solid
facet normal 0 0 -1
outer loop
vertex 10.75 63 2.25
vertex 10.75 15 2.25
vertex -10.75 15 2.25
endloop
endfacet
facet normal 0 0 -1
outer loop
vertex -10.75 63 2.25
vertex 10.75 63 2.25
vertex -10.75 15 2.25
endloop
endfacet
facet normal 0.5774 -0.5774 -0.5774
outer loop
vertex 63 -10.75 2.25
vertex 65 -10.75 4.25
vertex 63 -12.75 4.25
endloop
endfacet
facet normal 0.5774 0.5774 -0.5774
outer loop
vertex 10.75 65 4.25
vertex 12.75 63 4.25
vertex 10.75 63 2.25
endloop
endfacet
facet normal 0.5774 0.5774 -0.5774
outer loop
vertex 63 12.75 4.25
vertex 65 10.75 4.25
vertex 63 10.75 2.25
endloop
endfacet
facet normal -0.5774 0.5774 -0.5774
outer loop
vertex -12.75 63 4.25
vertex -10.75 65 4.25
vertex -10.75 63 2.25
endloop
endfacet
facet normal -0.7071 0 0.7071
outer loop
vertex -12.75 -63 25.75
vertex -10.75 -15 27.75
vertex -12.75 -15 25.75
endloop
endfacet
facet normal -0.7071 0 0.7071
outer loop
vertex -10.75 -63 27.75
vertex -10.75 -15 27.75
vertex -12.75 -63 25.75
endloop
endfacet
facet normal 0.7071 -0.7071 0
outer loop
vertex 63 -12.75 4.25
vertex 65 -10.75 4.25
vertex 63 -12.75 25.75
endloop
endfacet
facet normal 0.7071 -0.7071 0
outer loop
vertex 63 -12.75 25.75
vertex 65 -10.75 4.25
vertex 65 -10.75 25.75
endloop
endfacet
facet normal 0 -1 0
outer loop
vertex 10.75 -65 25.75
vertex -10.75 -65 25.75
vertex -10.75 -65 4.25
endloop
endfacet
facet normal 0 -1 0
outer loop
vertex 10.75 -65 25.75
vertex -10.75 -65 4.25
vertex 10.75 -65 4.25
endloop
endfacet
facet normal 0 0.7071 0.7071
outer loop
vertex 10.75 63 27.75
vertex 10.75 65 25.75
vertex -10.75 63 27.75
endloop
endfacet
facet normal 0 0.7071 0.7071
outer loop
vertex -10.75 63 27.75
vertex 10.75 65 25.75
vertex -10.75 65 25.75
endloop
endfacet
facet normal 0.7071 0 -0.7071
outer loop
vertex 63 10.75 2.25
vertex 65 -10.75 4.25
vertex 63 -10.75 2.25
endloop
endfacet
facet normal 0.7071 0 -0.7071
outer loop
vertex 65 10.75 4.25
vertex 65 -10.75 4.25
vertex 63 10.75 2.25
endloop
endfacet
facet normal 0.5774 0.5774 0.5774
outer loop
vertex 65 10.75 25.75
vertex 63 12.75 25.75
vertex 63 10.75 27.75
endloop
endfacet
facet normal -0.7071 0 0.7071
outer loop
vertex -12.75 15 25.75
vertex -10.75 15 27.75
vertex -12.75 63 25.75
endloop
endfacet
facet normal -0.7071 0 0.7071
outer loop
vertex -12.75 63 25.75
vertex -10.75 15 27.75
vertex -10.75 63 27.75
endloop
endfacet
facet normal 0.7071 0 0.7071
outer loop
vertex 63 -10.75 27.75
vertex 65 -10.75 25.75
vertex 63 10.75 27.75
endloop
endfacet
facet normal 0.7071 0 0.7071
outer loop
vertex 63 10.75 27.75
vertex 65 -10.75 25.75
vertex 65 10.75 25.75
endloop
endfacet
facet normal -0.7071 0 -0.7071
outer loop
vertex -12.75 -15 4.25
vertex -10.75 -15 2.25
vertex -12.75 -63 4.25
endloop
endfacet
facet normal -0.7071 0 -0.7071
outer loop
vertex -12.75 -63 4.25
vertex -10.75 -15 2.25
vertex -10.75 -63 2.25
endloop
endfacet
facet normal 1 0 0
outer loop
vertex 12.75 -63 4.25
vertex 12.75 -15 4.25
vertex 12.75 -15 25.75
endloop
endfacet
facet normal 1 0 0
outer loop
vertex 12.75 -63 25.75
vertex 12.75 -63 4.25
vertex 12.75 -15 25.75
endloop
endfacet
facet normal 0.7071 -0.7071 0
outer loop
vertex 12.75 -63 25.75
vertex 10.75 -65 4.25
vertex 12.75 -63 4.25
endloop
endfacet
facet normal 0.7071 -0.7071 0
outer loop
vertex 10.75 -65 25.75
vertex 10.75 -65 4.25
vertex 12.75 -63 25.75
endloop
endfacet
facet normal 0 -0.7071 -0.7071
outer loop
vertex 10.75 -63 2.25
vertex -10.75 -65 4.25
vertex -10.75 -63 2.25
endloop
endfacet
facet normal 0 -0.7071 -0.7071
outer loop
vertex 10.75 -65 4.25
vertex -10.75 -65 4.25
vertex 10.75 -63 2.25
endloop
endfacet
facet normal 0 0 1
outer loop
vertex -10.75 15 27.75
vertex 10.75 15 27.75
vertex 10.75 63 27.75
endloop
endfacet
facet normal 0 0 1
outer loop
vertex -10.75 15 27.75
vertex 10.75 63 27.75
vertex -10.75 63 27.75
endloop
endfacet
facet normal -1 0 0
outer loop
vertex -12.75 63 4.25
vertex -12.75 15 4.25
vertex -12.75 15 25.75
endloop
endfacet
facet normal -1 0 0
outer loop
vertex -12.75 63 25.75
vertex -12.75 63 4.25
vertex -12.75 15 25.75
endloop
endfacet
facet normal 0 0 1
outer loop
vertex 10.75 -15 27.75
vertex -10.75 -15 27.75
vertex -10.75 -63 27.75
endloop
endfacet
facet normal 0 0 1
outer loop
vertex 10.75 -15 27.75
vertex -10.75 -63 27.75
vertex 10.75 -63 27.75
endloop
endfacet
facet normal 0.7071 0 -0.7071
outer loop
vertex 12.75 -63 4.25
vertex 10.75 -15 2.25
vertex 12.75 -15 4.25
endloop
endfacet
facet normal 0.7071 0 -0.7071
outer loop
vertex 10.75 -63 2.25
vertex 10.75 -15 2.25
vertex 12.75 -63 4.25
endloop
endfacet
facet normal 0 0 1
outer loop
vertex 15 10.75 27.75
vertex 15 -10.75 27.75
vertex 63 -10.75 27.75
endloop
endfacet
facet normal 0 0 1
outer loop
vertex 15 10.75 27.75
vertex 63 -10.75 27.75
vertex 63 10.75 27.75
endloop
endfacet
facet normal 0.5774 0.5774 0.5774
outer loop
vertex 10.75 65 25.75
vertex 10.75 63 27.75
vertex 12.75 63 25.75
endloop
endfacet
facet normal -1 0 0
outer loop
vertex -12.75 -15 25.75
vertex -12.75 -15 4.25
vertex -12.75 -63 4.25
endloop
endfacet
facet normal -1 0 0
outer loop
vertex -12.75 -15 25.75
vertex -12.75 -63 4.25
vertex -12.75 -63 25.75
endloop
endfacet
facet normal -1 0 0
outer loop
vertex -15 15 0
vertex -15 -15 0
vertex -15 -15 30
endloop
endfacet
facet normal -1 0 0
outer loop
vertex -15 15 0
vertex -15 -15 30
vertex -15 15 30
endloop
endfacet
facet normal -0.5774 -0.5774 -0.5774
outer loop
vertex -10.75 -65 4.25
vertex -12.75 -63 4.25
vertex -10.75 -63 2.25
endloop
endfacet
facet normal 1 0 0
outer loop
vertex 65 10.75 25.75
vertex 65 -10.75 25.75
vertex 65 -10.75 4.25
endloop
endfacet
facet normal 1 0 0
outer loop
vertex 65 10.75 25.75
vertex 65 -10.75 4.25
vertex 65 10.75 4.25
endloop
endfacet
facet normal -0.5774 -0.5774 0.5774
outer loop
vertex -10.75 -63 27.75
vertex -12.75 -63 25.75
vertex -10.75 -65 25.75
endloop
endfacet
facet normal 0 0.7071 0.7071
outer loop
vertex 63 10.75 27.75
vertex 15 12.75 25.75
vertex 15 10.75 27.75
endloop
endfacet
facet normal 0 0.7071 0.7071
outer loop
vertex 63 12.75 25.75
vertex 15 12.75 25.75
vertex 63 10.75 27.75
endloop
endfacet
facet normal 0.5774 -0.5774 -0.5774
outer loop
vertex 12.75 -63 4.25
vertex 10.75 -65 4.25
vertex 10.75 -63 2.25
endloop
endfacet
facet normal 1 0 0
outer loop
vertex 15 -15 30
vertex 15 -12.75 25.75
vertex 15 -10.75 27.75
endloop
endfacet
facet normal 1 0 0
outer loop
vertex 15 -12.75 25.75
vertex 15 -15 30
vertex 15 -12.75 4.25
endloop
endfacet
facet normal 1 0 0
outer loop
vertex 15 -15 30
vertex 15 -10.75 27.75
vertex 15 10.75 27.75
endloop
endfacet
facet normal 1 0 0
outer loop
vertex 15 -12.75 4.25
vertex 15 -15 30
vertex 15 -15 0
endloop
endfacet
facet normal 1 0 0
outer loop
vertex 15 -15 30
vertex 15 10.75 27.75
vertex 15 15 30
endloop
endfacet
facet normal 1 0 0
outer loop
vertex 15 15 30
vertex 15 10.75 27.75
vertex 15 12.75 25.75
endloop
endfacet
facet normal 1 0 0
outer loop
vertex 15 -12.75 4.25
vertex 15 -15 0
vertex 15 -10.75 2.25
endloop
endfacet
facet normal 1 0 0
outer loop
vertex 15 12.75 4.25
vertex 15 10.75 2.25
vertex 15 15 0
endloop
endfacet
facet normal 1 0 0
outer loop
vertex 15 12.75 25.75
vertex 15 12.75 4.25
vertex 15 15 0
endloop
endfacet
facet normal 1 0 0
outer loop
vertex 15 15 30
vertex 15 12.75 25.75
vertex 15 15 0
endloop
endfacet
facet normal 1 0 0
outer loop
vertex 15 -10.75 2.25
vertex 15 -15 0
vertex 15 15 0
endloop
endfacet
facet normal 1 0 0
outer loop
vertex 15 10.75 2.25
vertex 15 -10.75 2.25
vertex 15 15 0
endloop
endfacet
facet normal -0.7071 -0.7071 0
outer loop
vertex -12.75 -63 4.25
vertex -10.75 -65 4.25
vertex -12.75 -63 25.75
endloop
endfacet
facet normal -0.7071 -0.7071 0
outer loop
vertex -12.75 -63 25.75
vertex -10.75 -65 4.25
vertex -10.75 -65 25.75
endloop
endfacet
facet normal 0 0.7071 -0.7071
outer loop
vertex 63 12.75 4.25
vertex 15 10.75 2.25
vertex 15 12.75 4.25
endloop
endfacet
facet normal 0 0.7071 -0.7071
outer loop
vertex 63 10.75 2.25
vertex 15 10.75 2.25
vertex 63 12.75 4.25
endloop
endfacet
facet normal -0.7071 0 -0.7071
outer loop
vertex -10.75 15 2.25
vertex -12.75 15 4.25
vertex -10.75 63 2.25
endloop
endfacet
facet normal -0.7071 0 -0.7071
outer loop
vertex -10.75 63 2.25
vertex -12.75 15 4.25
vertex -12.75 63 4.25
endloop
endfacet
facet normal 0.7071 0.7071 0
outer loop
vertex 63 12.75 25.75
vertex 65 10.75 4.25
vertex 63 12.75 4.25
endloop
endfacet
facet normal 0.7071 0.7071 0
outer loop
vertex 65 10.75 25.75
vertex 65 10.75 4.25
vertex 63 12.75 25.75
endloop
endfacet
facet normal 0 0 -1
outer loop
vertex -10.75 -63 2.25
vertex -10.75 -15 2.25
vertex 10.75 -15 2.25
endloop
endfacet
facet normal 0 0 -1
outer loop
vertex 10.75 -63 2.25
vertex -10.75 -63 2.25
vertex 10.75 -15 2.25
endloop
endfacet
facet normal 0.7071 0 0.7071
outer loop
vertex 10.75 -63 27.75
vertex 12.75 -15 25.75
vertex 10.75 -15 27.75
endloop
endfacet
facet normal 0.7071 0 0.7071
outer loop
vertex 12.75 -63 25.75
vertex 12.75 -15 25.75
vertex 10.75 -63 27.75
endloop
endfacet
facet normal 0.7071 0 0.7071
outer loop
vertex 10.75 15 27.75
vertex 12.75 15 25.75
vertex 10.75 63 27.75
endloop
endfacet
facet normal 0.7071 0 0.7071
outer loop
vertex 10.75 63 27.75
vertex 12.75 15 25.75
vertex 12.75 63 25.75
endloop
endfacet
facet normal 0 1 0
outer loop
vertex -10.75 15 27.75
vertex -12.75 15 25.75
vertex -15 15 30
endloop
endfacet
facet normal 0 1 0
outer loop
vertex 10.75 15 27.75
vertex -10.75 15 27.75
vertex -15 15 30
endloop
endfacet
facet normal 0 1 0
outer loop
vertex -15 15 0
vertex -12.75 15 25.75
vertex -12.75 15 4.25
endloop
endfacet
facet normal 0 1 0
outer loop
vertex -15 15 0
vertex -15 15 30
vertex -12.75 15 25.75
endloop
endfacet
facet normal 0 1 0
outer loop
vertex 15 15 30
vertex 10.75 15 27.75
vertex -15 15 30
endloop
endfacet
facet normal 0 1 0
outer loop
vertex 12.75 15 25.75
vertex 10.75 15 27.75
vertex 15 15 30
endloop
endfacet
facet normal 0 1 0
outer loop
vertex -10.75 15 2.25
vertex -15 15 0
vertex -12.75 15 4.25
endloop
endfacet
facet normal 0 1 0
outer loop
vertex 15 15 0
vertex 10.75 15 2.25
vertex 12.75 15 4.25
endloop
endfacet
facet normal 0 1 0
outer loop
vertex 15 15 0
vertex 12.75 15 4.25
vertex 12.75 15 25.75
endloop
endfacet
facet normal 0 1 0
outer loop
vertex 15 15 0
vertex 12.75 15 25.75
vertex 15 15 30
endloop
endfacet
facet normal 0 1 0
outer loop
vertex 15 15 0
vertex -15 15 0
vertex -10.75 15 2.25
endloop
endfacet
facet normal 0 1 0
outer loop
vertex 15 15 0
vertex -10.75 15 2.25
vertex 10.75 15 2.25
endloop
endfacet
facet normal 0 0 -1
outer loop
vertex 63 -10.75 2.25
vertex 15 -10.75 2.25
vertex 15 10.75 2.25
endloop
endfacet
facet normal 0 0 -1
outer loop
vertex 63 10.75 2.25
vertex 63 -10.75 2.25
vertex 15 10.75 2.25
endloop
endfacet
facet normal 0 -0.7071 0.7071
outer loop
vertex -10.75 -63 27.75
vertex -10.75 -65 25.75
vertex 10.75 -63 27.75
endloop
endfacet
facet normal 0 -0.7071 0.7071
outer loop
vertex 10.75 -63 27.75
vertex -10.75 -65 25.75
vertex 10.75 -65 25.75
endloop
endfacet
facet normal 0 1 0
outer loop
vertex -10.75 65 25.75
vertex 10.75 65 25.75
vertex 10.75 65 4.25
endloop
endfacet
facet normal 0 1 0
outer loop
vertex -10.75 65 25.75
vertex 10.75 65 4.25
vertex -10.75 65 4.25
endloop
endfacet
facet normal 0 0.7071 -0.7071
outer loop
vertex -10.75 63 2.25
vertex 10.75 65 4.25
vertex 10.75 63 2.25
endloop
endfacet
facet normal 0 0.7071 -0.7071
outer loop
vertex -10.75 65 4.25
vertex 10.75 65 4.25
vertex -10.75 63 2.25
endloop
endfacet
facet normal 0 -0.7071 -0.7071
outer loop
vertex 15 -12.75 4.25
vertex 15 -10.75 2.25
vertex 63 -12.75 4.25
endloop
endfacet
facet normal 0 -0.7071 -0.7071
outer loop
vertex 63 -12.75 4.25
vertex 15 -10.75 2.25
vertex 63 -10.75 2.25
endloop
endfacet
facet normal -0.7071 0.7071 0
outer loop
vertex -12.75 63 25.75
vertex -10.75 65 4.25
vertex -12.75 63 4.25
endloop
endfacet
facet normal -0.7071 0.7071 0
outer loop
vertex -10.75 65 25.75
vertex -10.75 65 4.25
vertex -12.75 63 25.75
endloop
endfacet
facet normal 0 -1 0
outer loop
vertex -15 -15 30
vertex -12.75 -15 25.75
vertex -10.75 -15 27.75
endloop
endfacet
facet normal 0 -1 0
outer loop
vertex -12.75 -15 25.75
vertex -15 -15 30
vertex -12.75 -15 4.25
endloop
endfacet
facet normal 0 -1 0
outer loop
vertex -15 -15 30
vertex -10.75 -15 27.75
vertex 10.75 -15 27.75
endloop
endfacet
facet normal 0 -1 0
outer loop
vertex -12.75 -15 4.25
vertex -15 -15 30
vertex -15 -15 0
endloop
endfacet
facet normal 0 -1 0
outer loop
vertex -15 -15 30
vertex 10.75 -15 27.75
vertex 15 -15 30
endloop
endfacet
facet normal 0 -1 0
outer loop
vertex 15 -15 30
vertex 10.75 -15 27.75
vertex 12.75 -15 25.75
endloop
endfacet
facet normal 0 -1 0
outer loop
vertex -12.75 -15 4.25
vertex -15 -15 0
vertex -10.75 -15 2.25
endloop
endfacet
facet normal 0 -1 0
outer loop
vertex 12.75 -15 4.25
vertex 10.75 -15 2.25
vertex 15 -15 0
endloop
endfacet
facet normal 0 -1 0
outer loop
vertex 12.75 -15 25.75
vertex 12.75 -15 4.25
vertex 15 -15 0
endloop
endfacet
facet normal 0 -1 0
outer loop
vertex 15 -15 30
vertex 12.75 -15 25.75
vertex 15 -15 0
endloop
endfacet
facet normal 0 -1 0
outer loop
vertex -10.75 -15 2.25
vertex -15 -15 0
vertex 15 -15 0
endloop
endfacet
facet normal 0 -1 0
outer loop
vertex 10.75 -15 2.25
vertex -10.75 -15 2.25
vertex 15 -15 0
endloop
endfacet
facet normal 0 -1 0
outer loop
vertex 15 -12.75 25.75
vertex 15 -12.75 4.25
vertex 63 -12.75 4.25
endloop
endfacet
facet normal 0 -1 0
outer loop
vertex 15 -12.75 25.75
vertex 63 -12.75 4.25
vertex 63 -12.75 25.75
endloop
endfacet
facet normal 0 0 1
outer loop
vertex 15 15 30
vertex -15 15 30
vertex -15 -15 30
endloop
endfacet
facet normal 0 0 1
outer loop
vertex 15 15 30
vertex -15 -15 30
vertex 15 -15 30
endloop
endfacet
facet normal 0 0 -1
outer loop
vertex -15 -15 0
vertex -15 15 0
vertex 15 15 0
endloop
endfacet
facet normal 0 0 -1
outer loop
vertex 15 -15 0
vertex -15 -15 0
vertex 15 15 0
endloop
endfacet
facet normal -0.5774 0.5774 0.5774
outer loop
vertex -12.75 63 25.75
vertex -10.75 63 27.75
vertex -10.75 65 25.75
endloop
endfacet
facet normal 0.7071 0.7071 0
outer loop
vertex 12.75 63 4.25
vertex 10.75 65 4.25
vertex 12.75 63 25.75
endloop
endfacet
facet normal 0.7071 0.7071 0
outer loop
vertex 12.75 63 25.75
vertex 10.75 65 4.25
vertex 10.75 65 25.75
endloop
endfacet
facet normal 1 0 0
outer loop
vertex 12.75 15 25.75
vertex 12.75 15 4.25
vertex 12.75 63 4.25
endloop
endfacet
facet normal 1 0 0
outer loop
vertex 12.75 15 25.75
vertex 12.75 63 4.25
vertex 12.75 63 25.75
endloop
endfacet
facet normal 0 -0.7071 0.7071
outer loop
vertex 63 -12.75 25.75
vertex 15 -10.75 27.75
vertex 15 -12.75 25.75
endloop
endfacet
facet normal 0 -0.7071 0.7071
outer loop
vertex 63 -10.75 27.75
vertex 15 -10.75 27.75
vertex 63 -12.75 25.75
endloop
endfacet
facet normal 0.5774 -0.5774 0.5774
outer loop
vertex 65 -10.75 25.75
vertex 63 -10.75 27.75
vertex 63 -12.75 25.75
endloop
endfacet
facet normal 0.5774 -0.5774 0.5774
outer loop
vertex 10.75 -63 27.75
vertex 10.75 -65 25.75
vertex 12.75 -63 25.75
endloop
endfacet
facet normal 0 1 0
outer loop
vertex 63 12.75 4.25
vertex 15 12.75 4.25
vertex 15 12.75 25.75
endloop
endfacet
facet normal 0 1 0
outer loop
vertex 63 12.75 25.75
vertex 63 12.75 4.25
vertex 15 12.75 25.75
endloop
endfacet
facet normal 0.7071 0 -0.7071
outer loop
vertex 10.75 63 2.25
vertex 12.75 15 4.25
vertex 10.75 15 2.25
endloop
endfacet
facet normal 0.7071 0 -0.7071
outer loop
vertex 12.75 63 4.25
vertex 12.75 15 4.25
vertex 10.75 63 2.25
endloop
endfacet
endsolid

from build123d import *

# Parameters (mm, degrees)
SKETCH_W        = 30
SKETCH_H        = 30
PAD_DEPTH       = 30
SKETCH001_W     = 25.5
SKETCH001_H     = 25.5
PAD001_DEPTH    = 50
CHAMFER_SIZE    = 2
SKETCH002_W     = 25.5
SKETCH002_H     = 25.5
PAD002_DEPTH    = 50
CHAMFER001_SIZE = 2
SKETCH003_W     = 25.5
SKETCH003_H     = 25.5
PAD003_DEPTH    = 50
CHAMFER002_SIZE = 2


with BuildPart() as part:
    # Sketch → Pad (new body)
    with BuildSketch(Plane.XY):
        Rectangle(SKETCH_W, SKETCH_H)
    extrude(amount=PAD_DEPTH)

    # Sketch001 (on Face2 of Pad) → Pad001 (join)
    with BuildSketch(Plane.XZ.offset(15)):
        with Locations((0, 15)):
            Rectangle(SKETCH001_W, SKETCH001_H)
    extrude(amount=PAD001_DEPTH)

    # Chamfer
    chamfer_edges = [part.edges().sort_by_distance(p)[0] for p in [
        (-12.75, -40, 27.75),
        (-12.75, -65, 15),
        (-12.75, -40, 2.25),
        (0, -65, 2.25),
        (12.75, -65, 15),
        (0, -65, 27.75),
        (12.75, -40, 27.75),
        (12.75, -40, 2.25),
    ]]
    chamfer(chamfer_edges, length=CHAMFER_SIZE)

    # Sketch002 (on Face10 of Chamfer) → Pad002 (join)
    with BuildSketch(Plane.YZ.offset(15)):
        with Locations((0, 15)):
            Rectangle(SKETCH002_W, SKETCH002_H)
    extrude(amount=PAD002_DEPTH)

    # Chamfer001
    chamfer001_edges = [part.edges().sort_by_distance(p)[0] for p in [
        (65, 12.75, 15),
        (40, 12.75, 27.75),
        (40, -12.75, 27.75),
        (65, 0, 27.75),
        (65, -12.75, 15),
        (65, 0, 2.25),
        (40, -12.75, 2.25),
        (40, 12.75, 2.25),
    ]]
    chamfer(chamfer001_edges, length=CHAMFER001_SIZE)

    # Sketch003 (on Face10 of Chamfer001) → Pad003 (join)
    with BuildSketch(Plane(origin=(0, 15, 0), x_dir=(-1, 0, 0), z_dir=(0, 1, 0))):
        with Locations((0, 15)):
            Rectangle(SKETCH003_W, SKETCH003_H)
    extrude(amount=PAD003_DEPTH)

    # Chamfer002
    chamfer002_edges = [part.edges().sort_by_distance(p)[0] for p in [
        (12.75, 40, 27.75),
        (-12.75, 40, 27.75),
        (0, 65, 27.75),
        (-12.75, 65, 15),
        (12.75, 65, 15),
        (12.75, 40, 2.25),
        (0, 65, 2.25),
        (-12.75, 40, 2.25),
    ]]
    chamfer(chamfer002_edges, length=CHAMFER002_SIZE)


solid = part.part
